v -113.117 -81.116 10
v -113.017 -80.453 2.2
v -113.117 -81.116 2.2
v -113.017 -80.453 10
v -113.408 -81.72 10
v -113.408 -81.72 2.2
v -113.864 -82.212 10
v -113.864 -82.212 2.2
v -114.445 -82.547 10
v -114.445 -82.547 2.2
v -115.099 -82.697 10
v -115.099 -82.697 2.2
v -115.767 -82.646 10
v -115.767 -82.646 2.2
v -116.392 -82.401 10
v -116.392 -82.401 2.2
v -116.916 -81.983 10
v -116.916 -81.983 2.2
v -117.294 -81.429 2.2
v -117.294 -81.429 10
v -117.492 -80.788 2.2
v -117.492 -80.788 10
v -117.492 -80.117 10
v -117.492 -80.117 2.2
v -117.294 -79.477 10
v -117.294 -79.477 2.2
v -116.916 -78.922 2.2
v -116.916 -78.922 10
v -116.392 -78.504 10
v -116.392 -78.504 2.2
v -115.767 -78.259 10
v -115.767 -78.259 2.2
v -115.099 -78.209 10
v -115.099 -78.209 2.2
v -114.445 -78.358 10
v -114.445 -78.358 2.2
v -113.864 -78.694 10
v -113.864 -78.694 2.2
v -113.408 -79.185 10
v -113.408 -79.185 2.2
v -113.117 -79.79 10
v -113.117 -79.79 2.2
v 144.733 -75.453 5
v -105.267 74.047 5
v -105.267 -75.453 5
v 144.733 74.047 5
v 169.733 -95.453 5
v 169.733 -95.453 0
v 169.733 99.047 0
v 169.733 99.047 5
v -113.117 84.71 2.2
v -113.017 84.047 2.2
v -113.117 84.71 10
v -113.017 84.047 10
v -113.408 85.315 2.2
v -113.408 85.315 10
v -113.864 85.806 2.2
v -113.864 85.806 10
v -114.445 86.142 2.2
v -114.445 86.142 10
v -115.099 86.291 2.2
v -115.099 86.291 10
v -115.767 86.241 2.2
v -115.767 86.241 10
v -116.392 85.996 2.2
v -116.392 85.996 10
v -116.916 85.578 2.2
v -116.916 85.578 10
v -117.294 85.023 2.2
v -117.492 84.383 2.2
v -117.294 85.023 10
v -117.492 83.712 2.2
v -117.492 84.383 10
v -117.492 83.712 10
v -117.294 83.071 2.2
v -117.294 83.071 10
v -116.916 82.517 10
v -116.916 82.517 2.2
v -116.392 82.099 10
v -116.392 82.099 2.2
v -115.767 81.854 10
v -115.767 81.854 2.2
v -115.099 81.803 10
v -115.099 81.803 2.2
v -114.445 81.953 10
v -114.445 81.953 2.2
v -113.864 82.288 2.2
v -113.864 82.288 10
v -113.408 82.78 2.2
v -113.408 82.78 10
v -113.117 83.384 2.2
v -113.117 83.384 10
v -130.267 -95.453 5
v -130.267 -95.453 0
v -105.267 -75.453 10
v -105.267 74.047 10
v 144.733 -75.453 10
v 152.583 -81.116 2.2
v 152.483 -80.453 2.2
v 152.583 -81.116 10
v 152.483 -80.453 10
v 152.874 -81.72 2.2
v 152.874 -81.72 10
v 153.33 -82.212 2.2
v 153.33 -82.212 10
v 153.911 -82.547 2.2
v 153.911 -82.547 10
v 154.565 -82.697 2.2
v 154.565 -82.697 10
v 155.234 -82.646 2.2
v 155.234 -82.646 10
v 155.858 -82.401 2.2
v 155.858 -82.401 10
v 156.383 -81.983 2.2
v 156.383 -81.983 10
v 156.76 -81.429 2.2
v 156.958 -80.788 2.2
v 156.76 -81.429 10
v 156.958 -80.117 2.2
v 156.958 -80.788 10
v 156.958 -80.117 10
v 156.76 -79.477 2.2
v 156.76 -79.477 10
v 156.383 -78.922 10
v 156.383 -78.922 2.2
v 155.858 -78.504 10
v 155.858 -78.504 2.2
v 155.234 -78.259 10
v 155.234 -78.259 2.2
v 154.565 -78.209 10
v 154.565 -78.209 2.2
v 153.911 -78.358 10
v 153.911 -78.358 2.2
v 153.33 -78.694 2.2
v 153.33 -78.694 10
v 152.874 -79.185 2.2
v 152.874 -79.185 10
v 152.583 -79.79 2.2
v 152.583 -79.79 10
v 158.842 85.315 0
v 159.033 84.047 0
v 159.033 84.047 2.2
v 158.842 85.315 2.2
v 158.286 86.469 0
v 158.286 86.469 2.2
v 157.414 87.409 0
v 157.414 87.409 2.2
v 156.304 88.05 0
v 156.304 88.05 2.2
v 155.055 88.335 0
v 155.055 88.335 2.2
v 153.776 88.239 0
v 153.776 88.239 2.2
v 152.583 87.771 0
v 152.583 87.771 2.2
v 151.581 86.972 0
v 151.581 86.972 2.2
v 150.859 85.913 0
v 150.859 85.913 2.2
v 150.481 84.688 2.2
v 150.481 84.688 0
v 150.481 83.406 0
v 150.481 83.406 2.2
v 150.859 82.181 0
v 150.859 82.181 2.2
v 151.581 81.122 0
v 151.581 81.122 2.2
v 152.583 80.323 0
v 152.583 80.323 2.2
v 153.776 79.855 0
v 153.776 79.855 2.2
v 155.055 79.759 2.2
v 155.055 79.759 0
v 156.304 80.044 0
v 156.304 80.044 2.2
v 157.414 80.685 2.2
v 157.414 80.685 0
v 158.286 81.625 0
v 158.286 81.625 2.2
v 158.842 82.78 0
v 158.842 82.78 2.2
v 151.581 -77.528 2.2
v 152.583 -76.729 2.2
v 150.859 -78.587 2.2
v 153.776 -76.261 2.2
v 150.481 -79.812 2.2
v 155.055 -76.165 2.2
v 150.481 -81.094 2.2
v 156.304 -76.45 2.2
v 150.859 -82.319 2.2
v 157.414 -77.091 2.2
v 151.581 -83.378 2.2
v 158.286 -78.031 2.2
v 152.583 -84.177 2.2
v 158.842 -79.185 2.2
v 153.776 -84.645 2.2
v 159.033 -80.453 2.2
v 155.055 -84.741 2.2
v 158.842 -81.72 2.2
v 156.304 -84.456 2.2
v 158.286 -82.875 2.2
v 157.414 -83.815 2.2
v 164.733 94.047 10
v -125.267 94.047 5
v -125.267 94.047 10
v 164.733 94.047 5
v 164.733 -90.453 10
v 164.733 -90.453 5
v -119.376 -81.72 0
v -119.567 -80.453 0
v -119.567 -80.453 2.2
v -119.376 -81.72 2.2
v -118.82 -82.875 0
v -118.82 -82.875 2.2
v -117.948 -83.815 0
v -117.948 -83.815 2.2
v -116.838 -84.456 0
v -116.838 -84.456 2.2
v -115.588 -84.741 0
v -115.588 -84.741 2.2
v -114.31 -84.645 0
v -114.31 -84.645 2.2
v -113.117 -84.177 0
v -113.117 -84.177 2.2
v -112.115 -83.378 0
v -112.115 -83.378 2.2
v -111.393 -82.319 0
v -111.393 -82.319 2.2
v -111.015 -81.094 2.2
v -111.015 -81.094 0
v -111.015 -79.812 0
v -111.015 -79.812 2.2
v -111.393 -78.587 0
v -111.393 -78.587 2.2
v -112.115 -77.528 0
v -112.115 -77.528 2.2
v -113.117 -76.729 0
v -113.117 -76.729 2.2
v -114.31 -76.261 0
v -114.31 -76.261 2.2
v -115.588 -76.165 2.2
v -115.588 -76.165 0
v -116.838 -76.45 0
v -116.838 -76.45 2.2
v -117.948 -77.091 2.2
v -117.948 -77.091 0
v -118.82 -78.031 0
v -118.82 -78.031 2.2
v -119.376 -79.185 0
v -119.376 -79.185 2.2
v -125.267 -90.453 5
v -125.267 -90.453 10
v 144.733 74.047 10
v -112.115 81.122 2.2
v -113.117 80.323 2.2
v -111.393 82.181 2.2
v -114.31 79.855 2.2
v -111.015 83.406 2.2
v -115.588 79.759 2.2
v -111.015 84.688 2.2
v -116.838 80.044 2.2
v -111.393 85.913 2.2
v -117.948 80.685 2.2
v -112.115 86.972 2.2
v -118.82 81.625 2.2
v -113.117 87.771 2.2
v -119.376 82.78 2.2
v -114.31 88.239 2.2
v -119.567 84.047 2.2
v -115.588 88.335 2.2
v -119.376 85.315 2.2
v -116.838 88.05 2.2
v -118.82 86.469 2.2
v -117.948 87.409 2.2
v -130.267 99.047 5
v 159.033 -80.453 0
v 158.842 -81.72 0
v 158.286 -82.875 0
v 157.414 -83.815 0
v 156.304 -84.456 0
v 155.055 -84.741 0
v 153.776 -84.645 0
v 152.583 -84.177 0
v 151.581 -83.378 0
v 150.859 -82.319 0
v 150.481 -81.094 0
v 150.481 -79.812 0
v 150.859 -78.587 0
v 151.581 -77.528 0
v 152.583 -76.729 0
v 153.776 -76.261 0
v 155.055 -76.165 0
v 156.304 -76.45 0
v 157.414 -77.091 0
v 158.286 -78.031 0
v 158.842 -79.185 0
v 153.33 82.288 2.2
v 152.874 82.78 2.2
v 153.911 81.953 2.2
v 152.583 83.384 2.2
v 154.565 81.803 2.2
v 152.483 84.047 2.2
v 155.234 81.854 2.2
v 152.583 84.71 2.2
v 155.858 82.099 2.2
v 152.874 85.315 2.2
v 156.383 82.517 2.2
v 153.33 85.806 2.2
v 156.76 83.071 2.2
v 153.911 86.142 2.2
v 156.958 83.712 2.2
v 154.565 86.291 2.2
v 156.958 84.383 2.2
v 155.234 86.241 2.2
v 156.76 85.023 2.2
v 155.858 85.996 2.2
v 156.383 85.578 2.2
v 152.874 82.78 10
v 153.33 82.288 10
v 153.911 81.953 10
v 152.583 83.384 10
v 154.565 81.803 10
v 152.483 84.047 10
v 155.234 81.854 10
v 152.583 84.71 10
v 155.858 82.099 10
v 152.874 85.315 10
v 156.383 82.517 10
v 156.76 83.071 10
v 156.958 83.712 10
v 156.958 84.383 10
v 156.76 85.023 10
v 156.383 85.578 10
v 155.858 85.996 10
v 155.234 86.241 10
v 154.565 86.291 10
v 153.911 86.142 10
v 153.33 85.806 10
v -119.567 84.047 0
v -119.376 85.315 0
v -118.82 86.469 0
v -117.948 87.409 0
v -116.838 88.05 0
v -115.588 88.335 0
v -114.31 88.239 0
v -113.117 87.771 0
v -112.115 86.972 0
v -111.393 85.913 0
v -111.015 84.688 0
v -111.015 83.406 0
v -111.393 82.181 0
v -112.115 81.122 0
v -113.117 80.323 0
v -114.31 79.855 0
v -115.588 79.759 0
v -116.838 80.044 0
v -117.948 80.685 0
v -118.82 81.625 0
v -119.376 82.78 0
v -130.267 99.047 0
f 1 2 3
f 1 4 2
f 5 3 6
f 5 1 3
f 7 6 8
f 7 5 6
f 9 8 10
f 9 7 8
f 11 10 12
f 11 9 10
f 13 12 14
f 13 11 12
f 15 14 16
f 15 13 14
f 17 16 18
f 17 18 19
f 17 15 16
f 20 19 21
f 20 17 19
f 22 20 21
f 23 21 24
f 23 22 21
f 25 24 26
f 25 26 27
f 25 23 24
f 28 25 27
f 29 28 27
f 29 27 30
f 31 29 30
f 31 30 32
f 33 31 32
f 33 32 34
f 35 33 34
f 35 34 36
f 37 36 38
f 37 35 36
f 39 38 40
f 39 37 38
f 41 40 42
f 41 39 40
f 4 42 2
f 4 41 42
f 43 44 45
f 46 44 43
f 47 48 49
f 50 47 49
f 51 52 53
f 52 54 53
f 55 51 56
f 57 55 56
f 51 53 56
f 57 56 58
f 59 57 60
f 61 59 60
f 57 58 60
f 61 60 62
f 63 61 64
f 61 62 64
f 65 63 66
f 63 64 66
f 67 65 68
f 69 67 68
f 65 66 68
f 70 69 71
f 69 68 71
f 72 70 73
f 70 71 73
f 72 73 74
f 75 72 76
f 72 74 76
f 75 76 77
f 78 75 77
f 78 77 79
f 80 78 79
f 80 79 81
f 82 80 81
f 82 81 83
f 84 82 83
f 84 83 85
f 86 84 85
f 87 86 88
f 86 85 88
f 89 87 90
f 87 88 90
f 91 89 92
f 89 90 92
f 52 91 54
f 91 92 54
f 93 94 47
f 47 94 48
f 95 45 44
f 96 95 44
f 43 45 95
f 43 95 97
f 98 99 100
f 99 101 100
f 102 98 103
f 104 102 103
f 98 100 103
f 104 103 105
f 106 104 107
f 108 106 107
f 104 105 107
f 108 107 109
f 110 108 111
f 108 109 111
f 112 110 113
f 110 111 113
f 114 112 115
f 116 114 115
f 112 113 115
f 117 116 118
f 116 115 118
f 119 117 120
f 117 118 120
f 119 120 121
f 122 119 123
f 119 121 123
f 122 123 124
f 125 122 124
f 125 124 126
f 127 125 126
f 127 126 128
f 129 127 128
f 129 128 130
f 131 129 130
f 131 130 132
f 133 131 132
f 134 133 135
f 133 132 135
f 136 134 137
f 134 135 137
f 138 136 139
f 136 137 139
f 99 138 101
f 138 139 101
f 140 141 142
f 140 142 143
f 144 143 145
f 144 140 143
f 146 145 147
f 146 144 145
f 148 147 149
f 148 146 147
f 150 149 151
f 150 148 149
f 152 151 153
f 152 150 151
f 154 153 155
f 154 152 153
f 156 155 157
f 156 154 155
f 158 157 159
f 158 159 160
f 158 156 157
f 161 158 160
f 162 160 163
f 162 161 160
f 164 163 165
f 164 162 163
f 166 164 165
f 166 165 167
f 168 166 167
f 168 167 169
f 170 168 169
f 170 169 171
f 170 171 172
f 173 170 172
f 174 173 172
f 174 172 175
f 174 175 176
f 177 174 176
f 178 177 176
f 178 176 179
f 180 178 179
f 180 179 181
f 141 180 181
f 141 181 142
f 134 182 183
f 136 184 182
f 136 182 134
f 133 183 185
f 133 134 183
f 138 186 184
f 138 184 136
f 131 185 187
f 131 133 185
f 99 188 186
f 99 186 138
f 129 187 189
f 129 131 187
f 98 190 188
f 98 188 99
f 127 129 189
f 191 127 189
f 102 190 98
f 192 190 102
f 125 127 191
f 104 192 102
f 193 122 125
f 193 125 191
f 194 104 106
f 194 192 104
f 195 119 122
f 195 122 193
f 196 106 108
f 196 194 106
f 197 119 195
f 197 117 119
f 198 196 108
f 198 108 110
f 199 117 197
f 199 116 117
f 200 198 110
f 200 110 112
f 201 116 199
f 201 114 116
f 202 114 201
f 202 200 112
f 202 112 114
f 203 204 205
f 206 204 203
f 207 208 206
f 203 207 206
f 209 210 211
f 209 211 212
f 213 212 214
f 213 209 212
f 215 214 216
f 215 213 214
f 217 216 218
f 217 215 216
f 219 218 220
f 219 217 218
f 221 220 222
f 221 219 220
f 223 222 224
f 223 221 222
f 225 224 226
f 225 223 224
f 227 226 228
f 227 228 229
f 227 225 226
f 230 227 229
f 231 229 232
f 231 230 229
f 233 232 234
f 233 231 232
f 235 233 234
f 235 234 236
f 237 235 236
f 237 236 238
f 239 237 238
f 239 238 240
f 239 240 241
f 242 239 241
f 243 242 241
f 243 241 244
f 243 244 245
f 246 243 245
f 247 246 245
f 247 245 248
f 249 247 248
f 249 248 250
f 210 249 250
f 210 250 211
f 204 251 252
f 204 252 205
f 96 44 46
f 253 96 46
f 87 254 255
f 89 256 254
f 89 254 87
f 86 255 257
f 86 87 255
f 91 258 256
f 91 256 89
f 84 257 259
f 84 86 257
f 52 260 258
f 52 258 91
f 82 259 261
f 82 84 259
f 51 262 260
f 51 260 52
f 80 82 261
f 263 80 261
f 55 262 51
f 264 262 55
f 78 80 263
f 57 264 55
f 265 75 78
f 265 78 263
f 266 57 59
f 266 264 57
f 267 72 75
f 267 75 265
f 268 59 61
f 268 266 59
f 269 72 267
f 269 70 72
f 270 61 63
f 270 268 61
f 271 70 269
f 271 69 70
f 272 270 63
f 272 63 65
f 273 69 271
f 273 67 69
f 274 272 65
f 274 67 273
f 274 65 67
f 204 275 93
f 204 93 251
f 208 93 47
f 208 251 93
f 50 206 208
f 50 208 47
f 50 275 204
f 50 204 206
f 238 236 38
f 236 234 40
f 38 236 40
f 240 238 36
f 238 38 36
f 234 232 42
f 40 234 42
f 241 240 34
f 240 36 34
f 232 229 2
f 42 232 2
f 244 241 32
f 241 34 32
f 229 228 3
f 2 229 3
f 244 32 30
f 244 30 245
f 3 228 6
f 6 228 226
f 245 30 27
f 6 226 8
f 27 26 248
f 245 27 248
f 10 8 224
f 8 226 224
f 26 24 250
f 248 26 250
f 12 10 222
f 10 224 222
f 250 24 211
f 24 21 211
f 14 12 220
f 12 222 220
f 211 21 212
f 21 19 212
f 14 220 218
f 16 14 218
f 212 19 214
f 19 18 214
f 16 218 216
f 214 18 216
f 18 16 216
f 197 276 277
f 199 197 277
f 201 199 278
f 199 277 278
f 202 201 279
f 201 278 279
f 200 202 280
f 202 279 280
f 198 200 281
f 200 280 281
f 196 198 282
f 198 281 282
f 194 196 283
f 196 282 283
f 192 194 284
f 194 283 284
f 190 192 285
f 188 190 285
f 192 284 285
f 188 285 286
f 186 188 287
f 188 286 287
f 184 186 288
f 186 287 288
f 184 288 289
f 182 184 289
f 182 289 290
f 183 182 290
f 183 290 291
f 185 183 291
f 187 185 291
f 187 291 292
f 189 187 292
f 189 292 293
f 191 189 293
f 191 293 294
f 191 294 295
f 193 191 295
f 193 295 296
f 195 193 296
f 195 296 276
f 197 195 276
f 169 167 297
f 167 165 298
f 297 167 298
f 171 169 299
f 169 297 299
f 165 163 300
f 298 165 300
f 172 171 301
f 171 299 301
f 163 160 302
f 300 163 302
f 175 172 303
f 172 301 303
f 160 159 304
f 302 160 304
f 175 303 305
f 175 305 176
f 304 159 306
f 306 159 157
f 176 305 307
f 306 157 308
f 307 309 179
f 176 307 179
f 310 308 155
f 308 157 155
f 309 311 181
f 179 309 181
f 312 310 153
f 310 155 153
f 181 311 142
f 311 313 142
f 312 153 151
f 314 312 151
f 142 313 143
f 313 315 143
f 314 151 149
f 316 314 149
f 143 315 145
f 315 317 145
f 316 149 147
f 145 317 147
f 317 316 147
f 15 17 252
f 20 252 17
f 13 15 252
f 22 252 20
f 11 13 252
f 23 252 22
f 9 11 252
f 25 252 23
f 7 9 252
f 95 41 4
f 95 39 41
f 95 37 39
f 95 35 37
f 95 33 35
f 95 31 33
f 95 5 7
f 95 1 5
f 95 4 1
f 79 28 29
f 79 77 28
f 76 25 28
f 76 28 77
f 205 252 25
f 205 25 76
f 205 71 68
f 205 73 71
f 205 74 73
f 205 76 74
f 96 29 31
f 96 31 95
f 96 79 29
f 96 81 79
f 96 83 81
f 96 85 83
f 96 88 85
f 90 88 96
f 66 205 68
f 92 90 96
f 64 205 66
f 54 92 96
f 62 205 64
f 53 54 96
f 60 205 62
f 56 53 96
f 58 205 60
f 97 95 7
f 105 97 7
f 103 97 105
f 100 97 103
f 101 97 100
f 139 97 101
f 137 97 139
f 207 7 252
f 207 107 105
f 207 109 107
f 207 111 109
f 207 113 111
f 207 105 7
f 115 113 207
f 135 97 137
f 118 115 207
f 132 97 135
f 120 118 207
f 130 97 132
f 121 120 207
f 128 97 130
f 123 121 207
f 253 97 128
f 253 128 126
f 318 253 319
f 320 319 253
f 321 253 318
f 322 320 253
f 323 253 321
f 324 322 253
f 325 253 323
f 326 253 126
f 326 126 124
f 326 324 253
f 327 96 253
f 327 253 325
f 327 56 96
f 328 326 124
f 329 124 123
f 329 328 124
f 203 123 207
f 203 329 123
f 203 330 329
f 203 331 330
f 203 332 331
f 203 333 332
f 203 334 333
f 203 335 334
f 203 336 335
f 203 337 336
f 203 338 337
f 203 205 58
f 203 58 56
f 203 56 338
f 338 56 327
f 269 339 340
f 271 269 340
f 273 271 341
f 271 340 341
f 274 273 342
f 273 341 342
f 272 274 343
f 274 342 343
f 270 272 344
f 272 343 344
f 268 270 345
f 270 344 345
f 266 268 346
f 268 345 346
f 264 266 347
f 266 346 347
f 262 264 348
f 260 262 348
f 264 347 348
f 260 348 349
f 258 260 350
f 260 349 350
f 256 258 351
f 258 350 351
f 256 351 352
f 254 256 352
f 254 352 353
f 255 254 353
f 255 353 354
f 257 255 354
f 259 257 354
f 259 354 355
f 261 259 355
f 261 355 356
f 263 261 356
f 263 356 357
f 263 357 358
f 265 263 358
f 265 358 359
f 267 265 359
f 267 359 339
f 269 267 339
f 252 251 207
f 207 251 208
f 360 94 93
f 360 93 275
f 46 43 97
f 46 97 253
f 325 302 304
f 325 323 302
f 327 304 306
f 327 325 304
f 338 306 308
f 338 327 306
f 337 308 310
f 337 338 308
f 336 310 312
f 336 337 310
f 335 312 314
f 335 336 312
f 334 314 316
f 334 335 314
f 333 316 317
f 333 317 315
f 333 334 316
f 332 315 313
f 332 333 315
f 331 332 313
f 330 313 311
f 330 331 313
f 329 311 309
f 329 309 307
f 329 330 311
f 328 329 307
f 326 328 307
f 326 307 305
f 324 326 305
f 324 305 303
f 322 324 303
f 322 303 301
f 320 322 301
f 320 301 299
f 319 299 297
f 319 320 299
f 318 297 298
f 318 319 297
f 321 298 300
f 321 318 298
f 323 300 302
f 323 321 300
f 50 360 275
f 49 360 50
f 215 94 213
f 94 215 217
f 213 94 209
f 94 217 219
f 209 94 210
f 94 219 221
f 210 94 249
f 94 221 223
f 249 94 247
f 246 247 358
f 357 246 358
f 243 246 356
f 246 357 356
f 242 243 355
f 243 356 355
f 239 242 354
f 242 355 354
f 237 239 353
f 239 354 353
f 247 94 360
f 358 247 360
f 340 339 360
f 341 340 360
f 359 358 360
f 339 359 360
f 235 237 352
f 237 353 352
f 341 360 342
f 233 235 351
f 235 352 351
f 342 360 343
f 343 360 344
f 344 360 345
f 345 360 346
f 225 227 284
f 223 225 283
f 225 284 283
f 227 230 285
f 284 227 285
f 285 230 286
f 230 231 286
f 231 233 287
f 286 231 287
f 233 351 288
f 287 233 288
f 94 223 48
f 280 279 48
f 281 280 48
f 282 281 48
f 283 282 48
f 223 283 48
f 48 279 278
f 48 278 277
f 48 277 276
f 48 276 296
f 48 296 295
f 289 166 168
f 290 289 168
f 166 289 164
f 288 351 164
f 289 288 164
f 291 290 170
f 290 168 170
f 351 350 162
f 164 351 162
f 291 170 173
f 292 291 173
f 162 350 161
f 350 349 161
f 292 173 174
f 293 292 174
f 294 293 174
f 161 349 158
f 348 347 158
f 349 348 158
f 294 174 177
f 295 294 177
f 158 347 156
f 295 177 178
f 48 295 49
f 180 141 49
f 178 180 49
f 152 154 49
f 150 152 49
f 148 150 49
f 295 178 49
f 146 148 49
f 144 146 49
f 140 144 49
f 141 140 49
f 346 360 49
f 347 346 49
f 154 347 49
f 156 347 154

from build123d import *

# Parameters (mm, degrees)
SKIZZE1_W                                           = 300
SKIZZE1_H                                           = 194.5
AUFSATZ_LINEAR_AUSTRAGEN1_DEPTH                     = 5
SKIZZE2_W                                           = 290
SKIZZE2_H                                           = 184.5
SKIZZE2_W_2                                         = 250
SKIZZE2_H_2                                         = 149.5
AUFSATZ_LINEAR_AUSTRAGEN2_DEPTH                     = 5
STIRNSENKUNG_F_R_M4_SENKSCHRAUBE_KOPF_B_D           = 4.5
STIRNSENKUNG_F_R_M4_SENKSCHRAUBE_KOPF_B_CBORE_D     = 8.6
STIRNSENKUNG_F_R_M4_SENKSCHRAUBE_KOPF_B_CBORE_DEPTH = 2.2
SPIEGELN2_COPY_1_D                                  = 4.5
SPIEGELN2_COPY_1_CBORE_D                            = 8.6
SPIEGELN2_COPY_1_CBORE_DEPTH                        = 2.2


with BuildPart() as part:
    # Skizze1 → Aufsatz-Linear austragen1 (new body)
    with BuildSketch(Plane.XY):
        with Locations((19.733299505, 1.797169811)):
            Rectangle(SKIZZE1_W, SKIZZE1_H)
    extrude(amount=AUFSATZ_LINEAR_AUSTRAGEN1_DEPTH)

    # Skizze2 → Aufsatz-Linear austragen2 (add)
    with BuildSketch(Plane.XY.offset(5)):
        with Locations((19.733299505, 1.797169811)):
            Rectangle(SKIZZE2_W, SKIZZE2_H)
        with Locations((19.733299505, -0.702830189)):
            Rectangle(SKIZZE2_W_2, SKIZZE2_H_2, mode=Mode.SUBTRACT)
    extrude(amount=AUFSATZ_LINEAR_AUSTRAGEN2_DEPTH)

    # Stirnsenkung für M4 Senkschraube (Kopf Button)1 (through all)
    with Locations(Plane(origin=(0, 0, 0), x_dir=(-1, 0, 0), z_dir=(0, 0, -1))):
        with Locations((115.266700495, 84.047169811)):
            stirnsenkung_f_r_m4_senkschraube_kopf_b = CounterBoreHole(STIRNSENKUNG_F_R_M4_SENKSCHRAUBE_KOPF_B_D / 2, STIRNSENKUNG_F_R_M4_SENKSCHRAUBE_KOPF_B_CBORE_D / 2, STIRNSENKUNG_F_R_M4_SENKSCHRAUBE_KOPF_B_CBORE_DEPTH)

    # Spiegeln1: Stirnsenkung für M4 Senkschraube (Kopf Button)1 across plane
    add(stirnsenkung_f_r_m4_senkschraube_kopf_b.mirror(Plane.ZX.offset(1.797169811)), mode=Mode.SUBTRACT)

    # Spiegeln2: Stirnsenkung für M4 Senkschraube (Kopf Button)1 across plane
    add(stirnsenkung_f_r_m4_senkschraube_kopf_b.mirror(Plane(origin=(19.733299505, 0, 0), x_dir=(0, 0, 1), z_dir=(1, 0, 0))), mode=Mode.SUBTRACT)

    # Spiegeln2 copy 1 (through all)
    with Locations(Plane(origin=(39.46659901, 3.594339623, 0), x_dir=(1, 0, 0), z_dir=(0, 0, -1))):
        with Locations((115.266700495, 84.047169811)):
            CounterBoreHole(SPIEGELN2_COPY_1_D / 2, SPIEGELN2_COPY_1_CBORE_D / 2, SPIEGELN2_COPY_1_CBORE_DEPTH)


solid = part.part
